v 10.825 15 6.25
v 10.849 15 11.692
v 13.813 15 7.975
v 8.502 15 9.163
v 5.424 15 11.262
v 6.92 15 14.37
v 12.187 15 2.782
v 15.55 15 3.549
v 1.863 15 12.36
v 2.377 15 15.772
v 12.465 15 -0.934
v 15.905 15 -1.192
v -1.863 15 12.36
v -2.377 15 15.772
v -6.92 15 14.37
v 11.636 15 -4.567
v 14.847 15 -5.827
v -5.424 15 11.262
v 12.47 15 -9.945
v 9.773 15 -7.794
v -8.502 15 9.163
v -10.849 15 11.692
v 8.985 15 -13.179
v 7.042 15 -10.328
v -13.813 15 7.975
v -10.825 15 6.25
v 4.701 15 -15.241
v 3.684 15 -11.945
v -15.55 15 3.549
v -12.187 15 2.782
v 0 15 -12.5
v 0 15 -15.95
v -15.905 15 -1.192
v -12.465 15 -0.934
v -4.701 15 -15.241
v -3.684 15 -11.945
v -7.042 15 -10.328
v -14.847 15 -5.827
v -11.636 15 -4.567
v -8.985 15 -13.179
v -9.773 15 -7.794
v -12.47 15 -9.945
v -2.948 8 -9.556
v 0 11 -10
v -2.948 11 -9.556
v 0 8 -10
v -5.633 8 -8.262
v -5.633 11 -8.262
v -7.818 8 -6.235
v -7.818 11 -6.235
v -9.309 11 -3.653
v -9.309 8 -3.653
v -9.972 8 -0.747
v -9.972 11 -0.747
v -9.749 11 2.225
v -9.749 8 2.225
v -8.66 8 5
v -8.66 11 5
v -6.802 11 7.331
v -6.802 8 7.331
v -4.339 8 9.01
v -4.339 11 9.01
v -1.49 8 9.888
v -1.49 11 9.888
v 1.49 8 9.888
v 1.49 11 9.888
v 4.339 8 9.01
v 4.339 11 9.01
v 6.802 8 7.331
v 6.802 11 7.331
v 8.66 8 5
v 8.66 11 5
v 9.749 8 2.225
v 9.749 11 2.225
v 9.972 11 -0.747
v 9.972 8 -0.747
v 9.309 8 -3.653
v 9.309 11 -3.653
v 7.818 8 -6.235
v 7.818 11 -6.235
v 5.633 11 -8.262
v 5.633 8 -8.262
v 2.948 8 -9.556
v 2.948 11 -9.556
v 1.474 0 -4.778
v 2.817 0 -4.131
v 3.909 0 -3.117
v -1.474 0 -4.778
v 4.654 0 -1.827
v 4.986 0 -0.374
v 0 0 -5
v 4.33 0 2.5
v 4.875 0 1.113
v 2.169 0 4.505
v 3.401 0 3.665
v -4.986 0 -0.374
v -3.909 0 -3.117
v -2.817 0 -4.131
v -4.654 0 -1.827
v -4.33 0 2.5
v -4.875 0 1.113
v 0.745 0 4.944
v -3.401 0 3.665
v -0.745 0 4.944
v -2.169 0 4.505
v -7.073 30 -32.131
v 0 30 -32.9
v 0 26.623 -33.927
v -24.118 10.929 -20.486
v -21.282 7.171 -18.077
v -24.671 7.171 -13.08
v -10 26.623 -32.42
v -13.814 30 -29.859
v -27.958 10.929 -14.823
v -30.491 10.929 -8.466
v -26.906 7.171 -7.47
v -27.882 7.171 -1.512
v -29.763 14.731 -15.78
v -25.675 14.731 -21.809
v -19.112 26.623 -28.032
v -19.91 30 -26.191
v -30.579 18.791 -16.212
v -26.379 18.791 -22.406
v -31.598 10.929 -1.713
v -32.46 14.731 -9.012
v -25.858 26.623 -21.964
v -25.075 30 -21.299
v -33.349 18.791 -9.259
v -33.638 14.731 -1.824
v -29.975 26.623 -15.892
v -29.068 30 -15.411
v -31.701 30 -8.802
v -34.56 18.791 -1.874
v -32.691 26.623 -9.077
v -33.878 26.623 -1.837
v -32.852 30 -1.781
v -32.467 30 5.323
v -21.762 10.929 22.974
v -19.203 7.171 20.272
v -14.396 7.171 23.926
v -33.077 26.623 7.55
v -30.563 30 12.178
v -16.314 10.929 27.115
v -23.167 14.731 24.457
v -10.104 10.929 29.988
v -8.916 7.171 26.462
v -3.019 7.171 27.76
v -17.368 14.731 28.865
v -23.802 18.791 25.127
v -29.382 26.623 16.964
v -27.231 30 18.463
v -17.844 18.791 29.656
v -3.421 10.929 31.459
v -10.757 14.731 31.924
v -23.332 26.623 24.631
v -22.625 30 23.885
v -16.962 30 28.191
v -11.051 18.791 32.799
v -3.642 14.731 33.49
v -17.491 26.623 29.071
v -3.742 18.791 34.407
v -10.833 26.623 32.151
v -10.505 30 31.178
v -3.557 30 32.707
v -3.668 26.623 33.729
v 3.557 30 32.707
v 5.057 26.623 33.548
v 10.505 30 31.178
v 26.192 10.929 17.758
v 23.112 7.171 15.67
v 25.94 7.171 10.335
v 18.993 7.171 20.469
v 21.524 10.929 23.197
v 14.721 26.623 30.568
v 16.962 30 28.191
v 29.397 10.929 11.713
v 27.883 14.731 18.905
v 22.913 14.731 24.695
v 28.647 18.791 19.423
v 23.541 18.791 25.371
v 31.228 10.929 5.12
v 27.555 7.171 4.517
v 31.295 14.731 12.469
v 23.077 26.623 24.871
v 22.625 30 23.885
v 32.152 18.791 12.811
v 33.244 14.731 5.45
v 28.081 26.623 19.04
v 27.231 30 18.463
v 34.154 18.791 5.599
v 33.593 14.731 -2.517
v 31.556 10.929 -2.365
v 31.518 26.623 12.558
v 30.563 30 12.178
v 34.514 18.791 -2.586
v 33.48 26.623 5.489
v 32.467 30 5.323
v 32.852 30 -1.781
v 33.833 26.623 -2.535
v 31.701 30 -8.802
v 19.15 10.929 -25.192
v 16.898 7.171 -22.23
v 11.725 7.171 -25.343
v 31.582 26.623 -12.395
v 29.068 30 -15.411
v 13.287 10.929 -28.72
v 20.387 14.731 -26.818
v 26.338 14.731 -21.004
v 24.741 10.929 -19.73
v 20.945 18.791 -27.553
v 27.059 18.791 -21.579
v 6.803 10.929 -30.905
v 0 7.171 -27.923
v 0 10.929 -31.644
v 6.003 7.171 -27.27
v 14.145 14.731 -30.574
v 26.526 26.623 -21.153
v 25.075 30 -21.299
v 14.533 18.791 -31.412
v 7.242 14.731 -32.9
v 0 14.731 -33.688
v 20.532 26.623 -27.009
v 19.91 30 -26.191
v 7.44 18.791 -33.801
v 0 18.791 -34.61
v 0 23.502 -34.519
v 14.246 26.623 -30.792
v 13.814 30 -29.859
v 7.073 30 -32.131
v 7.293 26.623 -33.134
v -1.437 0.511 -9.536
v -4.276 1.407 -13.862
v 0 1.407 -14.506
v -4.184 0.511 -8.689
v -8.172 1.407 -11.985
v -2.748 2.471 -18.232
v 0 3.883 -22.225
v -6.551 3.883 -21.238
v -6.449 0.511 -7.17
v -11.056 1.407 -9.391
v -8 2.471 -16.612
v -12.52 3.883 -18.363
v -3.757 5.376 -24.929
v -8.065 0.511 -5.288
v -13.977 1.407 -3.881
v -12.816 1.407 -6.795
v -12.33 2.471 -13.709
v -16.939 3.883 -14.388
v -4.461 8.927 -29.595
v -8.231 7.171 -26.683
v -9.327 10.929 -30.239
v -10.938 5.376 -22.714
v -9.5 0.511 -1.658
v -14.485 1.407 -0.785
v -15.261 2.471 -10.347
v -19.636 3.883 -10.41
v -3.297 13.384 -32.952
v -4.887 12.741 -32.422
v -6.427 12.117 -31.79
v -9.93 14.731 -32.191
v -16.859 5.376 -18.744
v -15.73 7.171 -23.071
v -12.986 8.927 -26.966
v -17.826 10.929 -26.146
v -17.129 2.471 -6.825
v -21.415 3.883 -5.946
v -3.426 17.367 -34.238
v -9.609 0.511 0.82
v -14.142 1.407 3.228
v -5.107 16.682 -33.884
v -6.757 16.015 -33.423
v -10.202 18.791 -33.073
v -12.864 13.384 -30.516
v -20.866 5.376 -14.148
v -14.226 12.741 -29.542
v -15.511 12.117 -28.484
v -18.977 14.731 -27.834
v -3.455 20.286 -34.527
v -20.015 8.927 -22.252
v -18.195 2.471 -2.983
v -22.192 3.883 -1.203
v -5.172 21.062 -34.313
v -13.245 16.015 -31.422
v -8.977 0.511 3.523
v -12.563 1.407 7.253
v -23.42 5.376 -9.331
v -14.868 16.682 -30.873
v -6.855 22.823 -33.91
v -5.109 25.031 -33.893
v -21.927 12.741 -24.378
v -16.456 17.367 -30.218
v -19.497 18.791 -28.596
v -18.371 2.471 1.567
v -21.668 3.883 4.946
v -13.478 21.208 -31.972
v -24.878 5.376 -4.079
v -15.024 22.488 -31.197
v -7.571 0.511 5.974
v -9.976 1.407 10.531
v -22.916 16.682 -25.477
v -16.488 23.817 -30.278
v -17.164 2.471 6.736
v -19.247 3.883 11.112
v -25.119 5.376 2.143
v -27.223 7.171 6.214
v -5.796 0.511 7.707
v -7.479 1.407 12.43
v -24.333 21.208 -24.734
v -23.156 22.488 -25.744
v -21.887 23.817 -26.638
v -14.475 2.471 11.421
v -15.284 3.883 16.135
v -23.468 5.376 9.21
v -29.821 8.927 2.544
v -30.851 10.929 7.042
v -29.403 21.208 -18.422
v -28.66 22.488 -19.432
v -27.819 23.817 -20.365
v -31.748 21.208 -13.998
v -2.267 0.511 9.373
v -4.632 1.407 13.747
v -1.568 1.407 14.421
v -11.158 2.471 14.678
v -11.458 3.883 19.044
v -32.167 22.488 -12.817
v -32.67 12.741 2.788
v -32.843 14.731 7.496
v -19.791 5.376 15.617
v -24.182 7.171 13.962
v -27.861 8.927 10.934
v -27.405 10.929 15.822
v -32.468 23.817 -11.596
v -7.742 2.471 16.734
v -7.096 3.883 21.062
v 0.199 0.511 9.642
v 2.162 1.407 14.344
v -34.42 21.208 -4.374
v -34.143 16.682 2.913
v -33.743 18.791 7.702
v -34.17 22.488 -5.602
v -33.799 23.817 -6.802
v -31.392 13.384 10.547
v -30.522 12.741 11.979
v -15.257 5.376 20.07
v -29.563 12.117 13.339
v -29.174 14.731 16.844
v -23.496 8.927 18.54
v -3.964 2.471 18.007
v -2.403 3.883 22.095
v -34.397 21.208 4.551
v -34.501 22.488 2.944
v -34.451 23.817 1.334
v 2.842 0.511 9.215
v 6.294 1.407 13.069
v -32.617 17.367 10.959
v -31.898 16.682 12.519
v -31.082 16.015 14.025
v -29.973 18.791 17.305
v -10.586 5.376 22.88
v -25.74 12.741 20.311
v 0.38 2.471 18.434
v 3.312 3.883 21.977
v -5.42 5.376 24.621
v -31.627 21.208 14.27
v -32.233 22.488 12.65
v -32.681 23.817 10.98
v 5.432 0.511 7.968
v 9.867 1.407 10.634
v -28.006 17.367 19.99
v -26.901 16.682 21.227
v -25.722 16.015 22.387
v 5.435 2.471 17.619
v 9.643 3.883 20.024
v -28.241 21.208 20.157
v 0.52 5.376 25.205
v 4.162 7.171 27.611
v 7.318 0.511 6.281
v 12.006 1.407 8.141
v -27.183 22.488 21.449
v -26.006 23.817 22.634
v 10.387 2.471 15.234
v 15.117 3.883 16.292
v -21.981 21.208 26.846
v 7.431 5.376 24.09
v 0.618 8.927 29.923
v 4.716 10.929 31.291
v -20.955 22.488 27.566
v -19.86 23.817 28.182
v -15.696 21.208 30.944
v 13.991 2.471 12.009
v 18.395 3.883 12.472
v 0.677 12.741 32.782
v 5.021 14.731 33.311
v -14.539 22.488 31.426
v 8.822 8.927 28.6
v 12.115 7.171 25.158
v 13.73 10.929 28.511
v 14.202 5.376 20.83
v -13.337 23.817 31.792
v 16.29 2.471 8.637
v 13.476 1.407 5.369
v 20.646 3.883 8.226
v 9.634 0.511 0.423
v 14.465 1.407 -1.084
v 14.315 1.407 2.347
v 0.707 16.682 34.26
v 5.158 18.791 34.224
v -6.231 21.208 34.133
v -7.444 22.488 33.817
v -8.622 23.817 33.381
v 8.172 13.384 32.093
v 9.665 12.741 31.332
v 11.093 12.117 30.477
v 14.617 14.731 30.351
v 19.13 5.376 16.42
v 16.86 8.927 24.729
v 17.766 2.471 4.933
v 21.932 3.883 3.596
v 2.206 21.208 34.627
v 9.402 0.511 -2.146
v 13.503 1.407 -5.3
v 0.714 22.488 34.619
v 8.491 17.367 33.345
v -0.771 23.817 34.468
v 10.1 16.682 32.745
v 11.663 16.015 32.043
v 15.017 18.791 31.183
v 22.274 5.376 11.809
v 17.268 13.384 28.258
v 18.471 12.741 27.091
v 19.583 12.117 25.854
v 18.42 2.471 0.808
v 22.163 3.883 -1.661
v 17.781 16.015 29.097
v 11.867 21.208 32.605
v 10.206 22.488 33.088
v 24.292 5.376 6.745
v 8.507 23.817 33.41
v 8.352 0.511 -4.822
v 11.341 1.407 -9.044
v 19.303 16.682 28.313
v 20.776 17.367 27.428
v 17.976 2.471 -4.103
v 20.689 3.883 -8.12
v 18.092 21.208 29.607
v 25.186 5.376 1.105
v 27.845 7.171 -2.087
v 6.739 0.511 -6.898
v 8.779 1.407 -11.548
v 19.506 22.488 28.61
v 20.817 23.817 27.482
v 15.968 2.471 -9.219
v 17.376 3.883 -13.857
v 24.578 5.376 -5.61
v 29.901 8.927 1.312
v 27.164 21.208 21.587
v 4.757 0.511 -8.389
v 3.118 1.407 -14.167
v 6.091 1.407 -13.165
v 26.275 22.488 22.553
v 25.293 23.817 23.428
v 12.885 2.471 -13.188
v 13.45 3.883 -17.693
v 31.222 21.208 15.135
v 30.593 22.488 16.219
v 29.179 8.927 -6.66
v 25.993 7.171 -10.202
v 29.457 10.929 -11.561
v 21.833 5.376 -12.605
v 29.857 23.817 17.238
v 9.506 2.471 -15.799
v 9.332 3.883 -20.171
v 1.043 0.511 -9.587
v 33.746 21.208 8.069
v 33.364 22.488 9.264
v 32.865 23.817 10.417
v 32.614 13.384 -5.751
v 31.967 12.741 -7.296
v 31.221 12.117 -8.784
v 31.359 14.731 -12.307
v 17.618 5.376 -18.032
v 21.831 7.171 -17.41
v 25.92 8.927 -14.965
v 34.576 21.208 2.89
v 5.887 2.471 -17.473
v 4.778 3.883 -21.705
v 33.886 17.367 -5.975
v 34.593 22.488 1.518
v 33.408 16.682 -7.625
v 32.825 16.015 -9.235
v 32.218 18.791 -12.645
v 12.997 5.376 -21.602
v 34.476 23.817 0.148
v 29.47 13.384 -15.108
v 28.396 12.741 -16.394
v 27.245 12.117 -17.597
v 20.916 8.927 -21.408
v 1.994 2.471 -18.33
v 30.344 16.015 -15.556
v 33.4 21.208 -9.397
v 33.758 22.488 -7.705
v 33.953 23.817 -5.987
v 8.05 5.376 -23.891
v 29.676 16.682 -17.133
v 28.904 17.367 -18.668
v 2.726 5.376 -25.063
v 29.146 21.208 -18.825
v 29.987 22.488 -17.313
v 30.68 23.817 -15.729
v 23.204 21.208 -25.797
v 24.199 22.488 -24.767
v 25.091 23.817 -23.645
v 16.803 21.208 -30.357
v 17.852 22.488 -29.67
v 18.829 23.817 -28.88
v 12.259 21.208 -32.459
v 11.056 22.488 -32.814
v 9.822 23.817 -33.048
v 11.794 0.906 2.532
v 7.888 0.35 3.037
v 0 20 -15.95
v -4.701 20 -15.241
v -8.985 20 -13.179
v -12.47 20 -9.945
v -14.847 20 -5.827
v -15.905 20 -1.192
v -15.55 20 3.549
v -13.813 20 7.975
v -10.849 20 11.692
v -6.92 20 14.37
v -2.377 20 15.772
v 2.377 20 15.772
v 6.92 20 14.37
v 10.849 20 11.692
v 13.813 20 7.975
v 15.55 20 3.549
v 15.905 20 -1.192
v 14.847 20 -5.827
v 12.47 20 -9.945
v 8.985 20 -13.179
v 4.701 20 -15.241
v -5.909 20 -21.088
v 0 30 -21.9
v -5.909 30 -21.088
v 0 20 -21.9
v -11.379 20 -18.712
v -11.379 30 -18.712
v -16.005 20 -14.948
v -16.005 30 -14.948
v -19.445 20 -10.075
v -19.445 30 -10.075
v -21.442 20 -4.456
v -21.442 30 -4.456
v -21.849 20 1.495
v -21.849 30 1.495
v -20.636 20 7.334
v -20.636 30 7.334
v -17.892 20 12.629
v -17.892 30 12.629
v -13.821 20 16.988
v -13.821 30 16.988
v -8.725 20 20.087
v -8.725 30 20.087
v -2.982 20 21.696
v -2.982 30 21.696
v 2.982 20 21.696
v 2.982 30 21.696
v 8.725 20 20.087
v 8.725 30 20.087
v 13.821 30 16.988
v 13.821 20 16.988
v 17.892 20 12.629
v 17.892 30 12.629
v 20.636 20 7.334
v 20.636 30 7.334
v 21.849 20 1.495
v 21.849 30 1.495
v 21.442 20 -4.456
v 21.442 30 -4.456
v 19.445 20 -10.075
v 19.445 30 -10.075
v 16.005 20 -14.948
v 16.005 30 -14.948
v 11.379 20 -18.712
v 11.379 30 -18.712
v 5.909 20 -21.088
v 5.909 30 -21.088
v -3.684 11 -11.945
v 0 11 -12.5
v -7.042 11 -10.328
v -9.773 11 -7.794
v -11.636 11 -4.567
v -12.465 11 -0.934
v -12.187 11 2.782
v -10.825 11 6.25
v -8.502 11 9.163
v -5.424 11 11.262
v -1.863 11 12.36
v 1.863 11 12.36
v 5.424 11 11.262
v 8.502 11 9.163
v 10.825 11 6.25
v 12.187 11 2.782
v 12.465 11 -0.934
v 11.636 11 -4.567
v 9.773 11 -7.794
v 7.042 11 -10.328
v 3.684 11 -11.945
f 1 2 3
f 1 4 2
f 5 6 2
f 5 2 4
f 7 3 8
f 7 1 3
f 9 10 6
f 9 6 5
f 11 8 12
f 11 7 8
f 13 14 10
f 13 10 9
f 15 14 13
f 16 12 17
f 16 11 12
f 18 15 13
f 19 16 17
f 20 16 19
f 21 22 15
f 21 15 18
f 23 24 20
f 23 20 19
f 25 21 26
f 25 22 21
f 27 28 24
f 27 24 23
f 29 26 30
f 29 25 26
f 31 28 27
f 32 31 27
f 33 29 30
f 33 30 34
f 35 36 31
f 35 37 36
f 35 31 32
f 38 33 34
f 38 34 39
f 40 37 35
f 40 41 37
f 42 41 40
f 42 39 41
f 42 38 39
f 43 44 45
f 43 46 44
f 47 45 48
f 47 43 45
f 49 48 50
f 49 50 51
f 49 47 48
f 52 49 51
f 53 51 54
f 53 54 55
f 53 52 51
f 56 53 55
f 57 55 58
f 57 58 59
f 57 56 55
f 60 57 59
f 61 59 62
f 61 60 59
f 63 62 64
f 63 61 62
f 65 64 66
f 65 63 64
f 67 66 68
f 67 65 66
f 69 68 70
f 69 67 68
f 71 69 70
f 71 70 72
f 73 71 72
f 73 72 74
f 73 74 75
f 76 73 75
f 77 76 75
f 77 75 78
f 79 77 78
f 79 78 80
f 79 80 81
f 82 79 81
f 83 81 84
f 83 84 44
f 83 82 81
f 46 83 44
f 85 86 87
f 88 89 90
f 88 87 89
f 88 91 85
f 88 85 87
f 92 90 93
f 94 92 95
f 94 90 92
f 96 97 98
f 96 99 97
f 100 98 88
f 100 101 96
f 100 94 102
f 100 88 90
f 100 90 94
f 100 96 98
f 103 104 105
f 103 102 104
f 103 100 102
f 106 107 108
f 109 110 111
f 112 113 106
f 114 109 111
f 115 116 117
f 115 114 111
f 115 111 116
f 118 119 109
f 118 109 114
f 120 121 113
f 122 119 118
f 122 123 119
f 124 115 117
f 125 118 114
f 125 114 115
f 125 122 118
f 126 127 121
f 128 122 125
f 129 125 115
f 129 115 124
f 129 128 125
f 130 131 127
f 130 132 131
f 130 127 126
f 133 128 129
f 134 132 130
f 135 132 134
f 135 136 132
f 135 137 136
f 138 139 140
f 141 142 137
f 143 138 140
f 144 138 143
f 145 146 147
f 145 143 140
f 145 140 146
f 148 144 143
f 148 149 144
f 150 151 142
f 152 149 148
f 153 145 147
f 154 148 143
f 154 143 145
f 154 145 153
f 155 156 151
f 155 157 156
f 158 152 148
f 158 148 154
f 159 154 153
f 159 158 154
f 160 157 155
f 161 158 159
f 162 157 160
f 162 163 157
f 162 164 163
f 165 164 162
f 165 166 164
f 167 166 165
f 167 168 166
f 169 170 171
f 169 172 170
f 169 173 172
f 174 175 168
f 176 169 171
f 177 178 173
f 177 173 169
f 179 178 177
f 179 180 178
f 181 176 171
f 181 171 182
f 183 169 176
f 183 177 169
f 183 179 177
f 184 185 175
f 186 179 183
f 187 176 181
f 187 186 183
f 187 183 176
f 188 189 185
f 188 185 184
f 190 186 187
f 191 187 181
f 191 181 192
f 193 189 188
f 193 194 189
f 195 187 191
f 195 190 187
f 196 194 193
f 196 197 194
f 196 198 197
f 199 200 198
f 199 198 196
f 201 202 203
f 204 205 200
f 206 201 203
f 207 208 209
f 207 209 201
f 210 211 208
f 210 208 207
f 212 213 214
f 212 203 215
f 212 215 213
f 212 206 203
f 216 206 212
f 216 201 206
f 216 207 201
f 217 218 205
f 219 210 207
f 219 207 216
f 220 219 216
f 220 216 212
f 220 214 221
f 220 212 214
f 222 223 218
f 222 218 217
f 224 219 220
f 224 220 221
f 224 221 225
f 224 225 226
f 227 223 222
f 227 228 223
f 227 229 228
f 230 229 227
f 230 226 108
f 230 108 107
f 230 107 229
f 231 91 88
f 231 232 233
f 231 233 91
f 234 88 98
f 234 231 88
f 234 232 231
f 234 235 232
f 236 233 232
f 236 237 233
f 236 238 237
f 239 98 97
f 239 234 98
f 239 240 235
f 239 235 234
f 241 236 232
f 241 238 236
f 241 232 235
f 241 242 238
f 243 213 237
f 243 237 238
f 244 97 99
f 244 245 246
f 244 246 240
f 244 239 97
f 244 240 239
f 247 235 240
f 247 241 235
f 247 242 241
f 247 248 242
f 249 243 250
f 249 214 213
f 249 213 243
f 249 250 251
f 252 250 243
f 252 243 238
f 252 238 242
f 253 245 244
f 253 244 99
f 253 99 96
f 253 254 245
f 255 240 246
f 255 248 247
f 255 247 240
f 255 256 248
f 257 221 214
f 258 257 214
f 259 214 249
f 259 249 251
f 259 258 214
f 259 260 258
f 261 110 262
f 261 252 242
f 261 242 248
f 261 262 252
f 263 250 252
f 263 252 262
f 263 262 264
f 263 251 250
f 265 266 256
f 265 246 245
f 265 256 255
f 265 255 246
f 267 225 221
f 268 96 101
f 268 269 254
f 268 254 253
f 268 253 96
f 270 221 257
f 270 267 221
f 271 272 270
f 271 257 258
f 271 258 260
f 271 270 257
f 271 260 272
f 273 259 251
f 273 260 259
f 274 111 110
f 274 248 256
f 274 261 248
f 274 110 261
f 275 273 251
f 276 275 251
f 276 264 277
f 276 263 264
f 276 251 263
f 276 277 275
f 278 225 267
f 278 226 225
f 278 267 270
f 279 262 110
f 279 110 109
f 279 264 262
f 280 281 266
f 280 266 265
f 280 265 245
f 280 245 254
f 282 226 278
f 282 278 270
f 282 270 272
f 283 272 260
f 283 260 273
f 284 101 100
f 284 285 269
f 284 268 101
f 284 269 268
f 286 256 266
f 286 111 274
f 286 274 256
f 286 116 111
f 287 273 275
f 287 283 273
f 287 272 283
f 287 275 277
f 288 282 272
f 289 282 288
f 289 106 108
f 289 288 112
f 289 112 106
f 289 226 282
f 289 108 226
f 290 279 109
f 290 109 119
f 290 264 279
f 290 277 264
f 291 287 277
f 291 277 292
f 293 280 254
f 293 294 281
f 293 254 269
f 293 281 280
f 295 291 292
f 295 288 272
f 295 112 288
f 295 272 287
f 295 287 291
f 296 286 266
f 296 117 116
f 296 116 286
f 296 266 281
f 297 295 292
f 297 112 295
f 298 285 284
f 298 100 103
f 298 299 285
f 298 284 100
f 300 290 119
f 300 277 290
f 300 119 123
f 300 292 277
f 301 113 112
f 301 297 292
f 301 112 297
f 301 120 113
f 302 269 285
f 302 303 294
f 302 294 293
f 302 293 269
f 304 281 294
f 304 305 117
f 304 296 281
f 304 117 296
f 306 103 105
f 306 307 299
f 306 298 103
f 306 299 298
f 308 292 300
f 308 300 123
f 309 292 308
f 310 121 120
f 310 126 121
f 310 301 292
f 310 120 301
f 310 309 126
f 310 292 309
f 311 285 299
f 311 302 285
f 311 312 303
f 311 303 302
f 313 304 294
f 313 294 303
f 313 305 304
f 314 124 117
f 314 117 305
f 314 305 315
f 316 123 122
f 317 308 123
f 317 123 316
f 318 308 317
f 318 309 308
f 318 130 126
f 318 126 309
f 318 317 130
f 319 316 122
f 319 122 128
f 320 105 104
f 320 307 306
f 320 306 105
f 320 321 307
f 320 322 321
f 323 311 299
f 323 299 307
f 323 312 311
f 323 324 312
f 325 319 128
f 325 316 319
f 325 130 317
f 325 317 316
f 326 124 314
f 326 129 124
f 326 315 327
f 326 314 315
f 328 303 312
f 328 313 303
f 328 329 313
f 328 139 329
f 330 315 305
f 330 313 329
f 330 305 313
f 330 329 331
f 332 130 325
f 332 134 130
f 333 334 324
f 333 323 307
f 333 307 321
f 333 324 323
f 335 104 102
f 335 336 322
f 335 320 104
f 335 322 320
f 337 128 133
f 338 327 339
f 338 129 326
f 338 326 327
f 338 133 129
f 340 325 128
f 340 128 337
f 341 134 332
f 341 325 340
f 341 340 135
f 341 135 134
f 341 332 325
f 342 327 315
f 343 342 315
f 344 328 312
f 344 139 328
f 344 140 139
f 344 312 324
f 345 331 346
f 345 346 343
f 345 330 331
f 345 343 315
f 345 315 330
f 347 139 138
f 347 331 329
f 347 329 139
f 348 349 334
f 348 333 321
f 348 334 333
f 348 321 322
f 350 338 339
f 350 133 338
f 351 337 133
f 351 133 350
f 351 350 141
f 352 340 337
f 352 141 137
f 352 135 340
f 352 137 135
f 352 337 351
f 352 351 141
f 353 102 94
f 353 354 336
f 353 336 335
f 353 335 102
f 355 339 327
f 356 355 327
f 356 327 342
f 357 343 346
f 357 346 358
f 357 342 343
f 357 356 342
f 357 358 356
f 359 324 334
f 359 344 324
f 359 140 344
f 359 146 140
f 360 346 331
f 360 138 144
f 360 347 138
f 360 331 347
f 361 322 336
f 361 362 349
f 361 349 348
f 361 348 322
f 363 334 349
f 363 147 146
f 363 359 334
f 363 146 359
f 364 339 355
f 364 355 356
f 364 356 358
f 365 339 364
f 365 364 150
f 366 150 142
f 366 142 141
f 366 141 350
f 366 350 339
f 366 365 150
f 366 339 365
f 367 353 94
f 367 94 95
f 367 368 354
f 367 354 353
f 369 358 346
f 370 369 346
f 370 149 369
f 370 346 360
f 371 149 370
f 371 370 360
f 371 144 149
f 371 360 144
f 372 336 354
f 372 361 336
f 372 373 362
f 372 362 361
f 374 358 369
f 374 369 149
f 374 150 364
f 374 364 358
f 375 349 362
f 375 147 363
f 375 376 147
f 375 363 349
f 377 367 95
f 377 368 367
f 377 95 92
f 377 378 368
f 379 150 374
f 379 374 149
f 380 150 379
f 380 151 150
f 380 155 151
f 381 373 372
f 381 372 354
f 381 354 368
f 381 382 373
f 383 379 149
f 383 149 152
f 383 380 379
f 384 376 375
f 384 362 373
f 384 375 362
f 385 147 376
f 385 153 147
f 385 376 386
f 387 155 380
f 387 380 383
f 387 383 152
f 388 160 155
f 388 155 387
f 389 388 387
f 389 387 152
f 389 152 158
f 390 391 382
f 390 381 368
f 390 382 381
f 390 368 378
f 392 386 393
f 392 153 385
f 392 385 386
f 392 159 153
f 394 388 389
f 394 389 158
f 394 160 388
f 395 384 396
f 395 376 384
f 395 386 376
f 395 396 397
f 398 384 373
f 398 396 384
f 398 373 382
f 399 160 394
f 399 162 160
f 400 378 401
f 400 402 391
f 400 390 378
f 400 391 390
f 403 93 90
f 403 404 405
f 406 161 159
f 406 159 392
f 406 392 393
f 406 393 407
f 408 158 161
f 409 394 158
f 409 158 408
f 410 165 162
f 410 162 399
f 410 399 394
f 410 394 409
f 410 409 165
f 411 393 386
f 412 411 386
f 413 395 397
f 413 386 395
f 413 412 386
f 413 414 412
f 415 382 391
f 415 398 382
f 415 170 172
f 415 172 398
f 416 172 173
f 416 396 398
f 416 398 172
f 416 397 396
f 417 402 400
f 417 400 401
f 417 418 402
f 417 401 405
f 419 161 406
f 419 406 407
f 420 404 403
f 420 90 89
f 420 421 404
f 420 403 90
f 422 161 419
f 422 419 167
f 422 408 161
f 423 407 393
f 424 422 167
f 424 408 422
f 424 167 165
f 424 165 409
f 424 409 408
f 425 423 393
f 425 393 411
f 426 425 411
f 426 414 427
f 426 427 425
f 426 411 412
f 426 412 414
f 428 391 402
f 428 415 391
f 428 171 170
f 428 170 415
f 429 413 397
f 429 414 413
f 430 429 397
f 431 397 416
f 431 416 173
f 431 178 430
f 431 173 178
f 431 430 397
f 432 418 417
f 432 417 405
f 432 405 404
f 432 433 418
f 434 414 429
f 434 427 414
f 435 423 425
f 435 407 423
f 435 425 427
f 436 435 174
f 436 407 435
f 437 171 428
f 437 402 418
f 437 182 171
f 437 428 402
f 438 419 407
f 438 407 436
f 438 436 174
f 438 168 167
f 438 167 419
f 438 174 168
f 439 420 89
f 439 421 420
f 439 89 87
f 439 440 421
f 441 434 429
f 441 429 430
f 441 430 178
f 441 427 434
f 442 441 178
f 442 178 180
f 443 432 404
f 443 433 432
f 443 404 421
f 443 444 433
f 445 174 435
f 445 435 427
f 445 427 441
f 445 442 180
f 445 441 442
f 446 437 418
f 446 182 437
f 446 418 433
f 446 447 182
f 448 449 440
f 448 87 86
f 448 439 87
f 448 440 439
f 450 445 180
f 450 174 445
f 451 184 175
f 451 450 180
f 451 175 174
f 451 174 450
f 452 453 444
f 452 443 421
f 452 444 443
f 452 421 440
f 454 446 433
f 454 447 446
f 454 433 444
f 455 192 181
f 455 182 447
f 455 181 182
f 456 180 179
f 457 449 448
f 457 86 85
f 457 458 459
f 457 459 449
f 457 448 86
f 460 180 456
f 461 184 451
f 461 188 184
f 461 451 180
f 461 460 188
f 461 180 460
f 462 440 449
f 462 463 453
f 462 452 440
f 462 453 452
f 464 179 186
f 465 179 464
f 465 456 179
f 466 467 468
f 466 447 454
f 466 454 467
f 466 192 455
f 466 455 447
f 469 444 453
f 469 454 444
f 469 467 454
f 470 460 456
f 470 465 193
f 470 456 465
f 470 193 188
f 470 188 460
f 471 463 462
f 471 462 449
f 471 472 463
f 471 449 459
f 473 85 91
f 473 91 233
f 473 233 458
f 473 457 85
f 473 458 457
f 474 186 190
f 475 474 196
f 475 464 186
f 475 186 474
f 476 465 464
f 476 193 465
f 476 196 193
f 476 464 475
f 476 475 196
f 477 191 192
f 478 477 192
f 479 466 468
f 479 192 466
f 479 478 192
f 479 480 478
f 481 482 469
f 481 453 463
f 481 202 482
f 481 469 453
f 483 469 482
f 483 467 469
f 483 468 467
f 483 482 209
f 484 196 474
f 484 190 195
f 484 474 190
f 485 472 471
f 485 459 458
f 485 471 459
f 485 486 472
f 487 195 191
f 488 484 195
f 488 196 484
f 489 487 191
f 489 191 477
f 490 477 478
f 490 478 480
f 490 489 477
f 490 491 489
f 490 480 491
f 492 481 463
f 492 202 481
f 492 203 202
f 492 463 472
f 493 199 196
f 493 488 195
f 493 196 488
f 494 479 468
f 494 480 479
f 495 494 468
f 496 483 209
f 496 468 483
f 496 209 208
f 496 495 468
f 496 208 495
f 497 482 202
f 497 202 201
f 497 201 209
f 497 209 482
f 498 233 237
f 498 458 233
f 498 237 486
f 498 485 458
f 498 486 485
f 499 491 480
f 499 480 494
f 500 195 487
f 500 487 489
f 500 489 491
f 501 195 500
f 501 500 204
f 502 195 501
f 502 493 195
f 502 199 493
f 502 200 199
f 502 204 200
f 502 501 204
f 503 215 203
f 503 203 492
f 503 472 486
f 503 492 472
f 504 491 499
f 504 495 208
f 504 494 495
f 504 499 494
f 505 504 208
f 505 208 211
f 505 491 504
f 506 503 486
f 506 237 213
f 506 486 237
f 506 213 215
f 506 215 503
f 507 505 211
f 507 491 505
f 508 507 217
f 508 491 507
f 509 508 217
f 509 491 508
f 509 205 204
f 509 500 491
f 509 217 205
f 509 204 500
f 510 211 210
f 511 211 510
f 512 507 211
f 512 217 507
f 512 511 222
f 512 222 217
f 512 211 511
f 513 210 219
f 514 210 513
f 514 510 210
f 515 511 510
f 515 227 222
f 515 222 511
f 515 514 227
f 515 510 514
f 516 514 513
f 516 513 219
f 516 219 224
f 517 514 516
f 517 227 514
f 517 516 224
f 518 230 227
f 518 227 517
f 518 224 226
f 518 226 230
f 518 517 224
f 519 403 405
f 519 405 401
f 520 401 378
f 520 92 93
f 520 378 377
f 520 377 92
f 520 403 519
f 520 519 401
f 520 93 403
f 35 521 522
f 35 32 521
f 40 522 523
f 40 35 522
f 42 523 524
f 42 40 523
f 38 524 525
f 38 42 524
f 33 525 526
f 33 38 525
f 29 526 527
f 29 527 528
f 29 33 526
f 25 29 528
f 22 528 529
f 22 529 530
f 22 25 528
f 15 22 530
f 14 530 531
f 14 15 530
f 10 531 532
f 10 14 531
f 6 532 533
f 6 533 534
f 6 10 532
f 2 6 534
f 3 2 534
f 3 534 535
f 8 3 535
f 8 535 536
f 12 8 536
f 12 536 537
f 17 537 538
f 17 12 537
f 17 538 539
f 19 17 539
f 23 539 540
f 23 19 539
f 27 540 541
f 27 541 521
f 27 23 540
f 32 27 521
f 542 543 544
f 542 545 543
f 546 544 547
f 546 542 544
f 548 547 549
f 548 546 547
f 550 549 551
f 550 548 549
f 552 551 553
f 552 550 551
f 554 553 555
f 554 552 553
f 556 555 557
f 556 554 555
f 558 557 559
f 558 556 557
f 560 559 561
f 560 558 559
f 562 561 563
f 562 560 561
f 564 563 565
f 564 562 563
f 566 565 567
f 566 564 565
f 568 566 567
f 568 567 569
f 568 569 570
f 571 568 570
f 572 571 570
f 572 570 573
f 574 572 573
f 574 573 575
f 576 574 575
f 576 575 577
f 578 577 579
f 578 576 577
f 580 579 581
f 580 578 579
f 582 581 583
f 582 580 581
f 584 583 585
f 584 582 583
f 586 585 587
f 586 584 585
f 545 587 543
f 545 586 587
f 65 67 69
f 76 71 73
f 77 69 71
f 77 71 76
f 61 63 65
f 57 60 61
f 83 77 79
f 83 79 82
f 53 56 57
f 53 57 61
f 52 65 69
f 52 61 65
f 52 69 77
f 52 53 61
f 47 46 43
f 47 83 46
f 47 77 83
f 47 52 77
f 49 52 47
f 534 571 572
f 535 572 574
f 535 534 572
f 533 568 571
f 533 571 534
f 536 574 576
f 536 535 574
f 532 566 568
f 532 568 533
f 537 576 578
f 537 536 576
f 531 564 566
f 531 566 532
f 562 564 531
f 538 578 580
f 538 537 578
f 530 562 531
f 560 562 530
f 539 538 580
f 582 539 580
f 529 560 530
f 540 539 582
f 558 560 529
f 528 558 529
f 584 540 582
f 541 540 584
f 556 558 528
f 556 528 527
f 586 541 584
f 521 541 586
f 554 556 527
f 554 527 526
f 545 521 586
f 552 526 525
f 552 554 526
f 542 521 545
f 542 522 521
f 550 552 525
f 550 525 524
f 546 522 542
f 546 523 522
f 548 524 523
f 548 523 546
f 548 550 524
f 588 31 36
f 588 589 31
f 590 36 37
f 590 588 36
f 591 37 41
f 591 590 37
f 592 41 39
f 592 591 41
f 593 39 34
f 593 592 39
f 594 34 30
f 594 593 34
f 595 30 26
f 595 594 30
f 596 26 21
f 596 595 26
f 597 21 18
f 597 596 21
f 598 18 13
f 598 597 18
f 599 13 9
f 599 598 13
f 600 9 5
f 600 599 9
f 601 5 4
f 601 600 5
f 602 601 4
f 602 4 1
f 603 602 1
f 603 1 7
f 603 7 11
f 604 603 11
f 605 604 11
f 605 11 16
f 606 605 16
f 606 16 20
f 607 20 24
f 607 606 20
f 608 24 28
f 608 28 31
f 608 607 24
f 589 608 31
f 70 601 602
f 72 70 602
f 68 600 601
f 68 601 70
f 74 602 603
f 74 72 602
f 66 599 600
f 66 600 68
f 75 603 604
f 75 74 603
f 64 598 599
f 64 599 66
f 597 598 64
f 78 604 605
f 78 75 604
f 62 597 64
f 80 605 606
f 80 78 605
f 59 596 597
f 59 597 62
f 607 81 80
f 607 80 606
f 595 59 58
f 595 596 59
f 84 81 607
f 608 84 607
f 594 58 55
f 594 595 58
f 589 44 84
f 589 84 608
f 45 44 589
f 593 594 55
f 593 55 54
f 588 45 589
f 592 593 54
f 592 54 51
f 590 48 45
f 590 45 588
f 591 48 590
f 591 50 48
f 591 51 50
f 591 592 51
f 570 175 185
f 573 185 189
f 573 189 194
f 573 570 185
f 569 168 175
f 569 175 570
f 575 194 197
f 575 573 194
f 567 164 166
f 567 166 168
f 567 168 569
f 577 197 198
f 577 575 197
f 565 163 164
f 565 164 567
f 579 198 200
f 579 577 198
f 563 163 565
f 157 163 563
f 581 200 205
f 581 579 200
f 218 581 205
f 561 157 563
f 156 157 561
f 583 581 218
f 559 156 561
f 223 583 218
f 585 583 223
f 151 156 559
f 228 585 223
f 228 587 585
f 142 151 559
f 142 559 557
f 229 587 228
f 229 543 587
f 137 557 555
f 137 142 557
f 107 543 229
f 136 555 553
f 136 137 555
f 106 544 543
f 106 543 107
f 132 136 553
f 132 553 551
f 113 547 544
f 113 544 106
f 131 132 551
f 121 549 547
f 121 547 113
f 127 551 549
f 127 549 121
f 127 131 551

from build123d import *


with BuildPart() as part:
    # 스케치2 → 회전2 (revolve)
    with BuildSketch(Plane.XY, mode=Mode.PRIVATE) as revolve_2_sk:
        with BuildLine():
            add(Edge.make_bspline(
                [(-5, 0), (-19.422390958, 1.115775905), (-41.11480778, 7.04489841), (-32.9, 30)],
                knots=[0, 0, 0, 0, 1, 1, 1, 1], degree=3))
            Line((-32.9, 30), (-21.9, 30))
            Line((-21.9, 30), (-21.9, 20))
            Line((-21.9, 20), (-15.95, 20))
            Line((-15.95, 20), (-15.95, 15))
            Line((-15.95, 15), (-12.5, 15))
            Line((-12.5, 15), (-12.5, 11))
            Line((-12.5, 11), (-10, 11))
            Line((-10, 11), (-10, 8))
            Line((-10, 8), (0, 8))
            Line((0, 8), (0, 0))
            Line((0, 0), (-5, 0))
        make_face()
    revolve(revolve_2_sk.sketch.rotate(Axis((0, 0, 0), (0, 1, 0)), 270), axis=Axis((0, 0, 0), (0, 1, 0)))


solid = part.part
